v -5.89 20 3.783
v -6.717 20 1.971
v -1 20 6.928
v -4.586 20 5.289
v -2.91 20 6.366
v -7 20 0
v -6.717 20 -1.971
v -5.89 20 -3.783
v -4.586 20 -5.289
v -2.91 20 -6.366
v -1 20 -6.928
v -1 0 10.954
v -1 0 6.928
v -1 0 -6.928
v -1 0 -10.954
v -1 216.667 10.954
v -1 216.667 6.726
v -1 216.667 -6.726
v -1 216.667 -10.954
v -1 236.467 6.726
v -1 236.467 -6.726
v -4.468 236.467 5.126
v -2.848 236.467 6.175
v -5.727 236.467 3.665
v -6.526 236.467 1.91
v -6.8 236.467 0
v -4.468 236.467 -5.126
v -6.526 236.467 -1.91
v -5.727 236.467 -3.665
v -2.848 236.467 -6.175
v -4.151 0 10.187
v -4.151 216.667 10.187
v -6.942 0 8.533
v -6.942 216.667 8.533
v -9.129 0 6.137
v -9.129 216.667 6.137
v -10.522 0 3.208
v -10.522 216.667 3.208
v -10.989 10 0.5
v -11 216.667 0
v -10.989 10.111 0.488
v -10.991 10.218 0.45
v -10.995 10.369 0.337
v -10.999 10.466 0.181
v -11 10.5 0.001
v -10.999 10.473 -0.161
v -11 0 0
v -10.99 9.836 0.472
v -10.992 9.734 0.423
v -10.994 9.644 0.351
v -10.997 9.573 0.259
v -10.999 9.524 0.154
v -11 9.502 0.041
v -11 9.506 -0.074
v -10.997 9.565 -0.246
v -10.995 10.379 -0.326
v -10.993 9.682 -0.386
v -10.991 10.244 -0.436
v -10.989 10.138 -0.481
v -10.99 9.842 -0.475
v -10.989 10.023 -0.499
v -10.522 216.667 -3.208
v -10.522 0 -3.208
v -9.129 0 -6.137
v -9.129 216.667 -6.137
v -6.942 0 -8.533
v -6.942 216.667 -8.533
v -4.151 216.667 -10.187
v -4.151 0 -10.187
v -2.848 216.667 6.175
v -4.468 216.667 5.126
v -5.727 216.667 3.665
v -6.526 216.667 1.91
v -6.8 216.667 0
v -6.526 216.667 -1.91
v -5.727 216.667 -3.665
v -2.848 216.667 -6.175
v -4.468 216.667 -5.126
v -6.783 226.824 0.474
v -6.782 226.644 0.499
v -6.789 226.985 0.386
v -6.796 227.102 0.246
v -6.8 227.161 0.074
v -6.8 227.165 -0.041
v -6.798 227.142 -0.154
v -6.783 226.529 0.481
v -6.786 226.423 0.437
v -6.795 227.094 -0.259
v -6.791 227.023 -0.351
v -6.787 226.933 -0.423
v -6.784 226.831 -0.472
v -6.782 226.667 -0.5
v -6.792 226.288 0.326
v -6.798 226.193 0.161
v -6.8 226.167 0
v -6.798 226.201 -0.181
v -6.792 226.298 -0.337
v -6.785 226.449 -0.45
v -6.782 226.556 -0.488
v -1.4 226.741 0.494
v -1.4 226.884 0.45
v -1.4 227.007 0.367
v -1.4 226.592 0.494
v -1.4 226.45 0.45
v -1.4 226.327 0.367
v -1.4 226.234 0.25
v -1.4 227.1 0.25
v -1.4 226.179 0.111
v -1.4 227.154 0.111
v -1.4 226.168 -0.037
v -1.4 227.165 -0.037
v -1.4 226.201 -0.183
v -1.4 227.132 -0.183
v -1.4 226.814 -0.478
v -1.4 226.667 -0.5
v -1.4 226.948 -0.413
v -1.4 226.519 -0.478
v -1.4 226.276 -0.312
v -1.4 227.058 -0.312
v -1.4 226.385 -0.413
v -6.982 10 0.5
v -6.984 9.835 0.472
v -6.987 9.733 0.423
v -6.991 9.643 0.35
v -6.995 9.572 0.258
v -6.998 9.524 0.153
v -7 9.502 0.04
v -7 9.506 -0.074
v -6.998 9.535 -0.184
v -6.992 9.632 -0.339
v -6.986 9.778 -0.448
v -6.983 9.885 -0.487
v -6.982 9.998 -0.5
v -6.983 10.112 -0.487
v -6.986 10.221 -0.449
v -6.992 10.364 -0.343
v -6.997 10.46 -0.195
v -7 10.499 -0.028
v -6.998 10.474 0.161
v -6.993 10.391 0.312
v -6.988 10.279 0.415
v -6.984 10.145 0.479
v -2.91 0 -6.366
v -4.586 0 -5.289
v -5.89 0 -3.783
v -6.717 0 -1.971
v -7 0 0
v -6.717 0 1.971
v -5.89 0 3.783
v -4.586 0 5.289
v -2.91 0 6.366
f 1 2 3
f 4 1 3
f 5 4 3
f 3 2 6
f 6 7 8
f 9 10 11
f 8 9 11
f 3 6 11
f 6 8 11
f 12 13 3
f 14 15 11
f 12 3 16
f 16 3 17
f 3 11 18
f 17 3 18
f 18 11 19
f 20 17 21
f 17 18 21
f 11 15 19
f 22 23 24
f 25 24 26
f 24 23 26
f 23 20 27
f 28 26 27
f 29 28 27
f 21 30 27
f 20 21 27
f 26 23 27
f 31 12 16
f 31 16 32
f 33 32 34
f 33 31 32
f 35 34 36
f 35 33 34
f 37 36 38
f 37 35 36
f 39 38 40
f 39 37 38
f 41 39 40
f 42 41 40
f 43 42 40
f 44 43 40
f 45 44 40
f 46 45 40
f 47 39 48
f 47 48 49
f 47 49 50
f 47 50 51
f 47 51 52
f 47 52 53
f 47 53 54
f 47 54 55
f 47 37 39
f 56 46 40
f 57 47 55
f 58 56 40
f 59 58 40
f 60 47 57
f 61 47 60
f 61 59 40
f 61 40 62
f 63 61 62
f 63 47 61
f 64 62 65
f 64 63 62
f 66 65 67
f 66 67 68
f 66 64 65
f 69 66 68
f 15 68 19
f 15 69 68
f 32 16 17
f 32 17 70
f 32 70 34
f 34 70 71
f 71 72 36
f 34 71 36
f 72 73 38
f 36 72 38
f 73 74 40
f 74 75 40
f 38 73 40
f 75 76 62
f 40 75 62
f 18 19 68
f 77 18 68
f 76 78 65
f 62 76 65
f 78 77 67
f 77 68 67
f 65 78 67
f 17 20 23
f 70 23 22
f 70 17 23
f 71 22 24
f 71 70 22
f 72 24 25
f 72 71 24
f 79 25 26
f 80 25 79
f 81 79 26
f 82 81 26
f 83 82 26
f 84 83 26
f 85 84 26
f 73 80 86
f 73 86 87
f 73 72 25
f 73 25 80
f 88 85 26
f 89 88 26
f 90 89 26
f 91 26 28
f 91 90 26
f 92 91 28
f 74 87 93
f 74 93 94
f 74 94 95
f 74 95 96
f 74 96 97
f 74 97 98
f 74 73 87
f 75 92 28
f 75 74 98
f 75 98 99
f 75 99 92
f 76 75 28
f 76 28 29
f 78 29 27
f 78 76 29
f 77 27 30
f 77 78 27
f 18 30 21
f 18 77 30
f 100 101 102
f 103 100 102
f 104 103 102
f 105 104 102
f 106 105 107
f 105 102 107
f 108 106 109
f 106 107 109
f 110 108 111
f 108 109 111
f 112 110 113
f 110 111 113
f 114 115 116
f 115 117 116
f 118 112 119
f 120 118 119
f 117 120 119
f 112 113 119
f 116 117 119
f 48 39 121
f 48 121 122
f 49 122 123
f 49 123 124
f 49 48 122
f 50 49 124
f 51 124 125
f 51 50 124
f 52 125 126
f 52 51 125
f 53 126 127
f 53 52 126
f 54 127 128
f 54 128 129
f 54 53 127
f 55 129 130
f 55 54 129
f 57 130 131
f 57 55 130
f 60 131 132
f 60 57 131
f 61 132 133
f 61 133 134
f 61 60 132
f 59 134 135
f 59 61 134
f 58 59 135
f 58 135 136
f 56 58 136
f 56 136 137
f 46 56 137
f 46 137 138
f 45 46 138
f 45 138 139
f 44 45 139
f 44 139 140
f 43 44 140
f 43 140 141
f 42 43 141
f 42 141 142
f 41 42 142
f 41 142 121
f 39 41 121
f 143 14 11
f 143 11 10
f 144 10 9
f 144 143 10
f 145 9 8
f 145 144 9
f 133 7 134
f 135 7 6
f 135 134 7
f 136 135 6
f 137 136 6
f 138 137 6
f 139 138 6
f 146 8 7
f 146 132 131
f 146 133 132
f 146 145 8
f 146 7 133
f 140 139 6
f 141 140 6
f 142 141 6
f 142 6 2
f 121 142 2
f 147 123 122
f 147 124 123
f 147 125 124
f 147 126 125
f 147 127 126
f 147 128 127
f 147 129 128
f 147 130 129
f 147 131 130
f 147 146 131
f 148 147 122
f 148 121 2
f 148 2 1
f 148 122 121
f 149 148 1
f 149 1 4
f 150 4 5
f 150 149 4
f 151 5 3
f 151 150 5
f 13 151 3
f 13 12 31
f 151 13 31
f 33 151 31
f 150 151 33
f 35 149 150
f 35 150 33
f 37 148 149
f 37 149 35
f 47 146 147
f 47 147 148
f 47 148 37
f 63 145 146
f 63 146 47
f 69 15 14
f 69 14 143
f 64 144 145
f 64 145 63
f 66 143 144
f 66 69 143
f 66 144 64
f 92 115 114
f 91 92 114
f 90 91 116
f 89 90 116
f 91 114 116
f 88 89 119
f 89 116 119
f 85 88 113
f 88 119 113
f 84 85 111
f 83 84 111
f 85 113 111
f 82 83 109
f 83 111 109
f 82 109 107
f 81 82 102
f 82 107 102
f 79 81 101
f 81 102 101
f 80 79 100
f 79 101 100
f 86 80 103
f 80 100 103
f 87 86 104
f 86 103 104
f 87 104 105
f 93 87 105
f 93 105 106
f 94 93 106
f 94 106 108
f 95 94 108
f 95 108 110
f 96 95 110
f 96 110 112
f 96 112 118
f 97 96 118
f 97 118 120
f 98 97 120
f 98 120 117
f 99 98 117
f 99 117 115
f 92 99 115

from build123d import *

# Parameters (mm, degrees)
BOSS_EXTRUDE1_DEPTH     = 216.66667
BOSS_EXTRUDE2_START     = 216.66667
BOSS_EXTRUDE2_DEPTH     = 19.8
CUT_EXTRUDE2_START      = -1.4
SKETCH4_R               = 0.5
CUT_EXTRUDE2_DEPTH      = 9
SKETCH6_R               = 7
CUT_EXTRUDE3_DEPTH      = 20
CUT_EXTRUDE4_DEPTH      = 237.977817671
CUT_EXTRUDE4_DEPTH_BACK = 20
SKETCH7_R               = 0.5
CUT_EXTRUDE5_DEPTH      = 237.97781768
CUT_EXTRUDE5_DEPTH_BACK = 237.97781768
SKETCH10_R              = 0.5
CUT_EXTRUDE6_DEPTH      = 237.97781768
CUT_EXTRUDE6_DEPTH_BACK = 237.97781768
SKETCH11_W              = 3.5
SKETCH11_H              = 216.66667
CUT_EXTRUDE7_DEPTH      = 237.975709212
CUT_EXTRUDE7_DEPTH_BACK = 237.975709212
SKETCH12_W              = 3.499316008
SKETCH12_H              = 20


with BuildPart() as part:
    # Sketch1 → Boss-Extrude1 (new body)
    with BuildSketch(Plane(origin=(0, 0, 0), x_dir=(1, 0, 0), z_dir=(0, 1, 0))):
        with BuildLine():
            Line((0, 11), (0, -11))
            ThreePointArc((0, -11), (-11, 0), (0, 11))
        make_face()
    extrude(amount=BOSS_EXTRUDE1_DEPTH)

    # Sketch2 → Boss-Extrude2 (add)
    with BuildSketch(Plane(origin=(0, 0, 0), x_dir=(1, 0, 0), z_dir=(0, 1, 0)).offset(BOSS_EXTRUDE2_START)):
        with BuildLine():
            Line((0, 6.8), (0, -6.8))
            ThreePointArc((0, -6.8), (-6.8, 0), (0, 6.8))
        make_face()
    extrude(amount=BOSS_EXTRUDE2_DEPTH)

    # Sketch4 → Cut-Extrude2 (cut)
    with BuildSketch(Plane(origin=(0, 0, 0), x_dir=(0, 0, -1), z_dir=(1, 0, 0)).offset(CUT_EXTRUDE2_START)):
        with Locations((0, 226.66667)):
            Circle(SKETCH4_R)
    extrude(amount=-CUT_EXTRUDE2_DEPTH, mode=Mode.SUBTRACT)

    # Sketch6 → Cut-Extrude3 (cut)
    with BuildSketch(Plane(origin=(0, 0, 0), x_dir=(1, 0, 0), z_dir=(0, 1, 0))):
        Circle(SKETCH6_R)
    extrude(amount=CUT_EXTRUDE3_DEPTH, mode=Mode.SUBTRACT)

    # Sketch7 → Cut-Extrude4 (cut, two sides: drawn at the far end of the back side and taken through both)
    with BuildSketch(Plane(origin=(0, 0, 0), x_dir=(0, 0, -1), z_dir=(1, 0, 0)).offset(-CUT_EXTRUDE4_DEPTH_BACK)):
        with Locations(Location((0, 10, 0), (0, 0, 180))):
            Circle(SKETCH7_R)
    extrude(amount=CUT_EXTRUDE4_DEPTH + CUT_EXTRUDE4_DEPTH_BACK, mode=Mode.SUBTRACT)

    # Sketch10 → Cut-Extrude5 (cut, two sides: drawn at the far end of the back side and taken through both)
    with BuildSketch(Plane.XY.offset(-CUT_EXTRUDE5_DEPTH_BACK)):
        with Locations((0, 5)):
            Circle(SKETCH10_R)
    extrude(amount=CUT_EXTRUDE5_DEPTH + CUT_EXTRUDE5_DEPTH_BACK, mode=Mode.SUBTRACT)

    # Sketch11 → Cut-Extrude6 (cut, two sides: drawn at the far end of the back side and taken through both)
    with BuildSketch(Plane.XY.offset(-CUT_EXTRUDE6_DEPTH_BACK)):
        with Locations((0.750341996, 108.333335)):
            Rectangle(SKETCH11_W, SKETCH11_H)
    extrude(amount=CUT_EXTRUDE6_DEPTH + CUT_EXTRUDE6_DEPTH_BACK, mode=Mode.SUBTRACT)

    # Sketch12 → Cut-Extrude7 (cut, two sides: drawn at the far end of the back side and taken through both)
    with BuildSketch(Plane.XY.offset(-CUT_EXTRUDE7_DEPTH_BACK)):
        with Locations((0.75, 226.66667)):
            Rectangle(SKETCH12_W, SKETCH12_H)
    extrude(amount=CUT_EXTRUDE7_DEPTH + CUT_EXTRUDE7_DEPTH_BACK, mode=Mode.SUBTRACT)


solid = part.part
